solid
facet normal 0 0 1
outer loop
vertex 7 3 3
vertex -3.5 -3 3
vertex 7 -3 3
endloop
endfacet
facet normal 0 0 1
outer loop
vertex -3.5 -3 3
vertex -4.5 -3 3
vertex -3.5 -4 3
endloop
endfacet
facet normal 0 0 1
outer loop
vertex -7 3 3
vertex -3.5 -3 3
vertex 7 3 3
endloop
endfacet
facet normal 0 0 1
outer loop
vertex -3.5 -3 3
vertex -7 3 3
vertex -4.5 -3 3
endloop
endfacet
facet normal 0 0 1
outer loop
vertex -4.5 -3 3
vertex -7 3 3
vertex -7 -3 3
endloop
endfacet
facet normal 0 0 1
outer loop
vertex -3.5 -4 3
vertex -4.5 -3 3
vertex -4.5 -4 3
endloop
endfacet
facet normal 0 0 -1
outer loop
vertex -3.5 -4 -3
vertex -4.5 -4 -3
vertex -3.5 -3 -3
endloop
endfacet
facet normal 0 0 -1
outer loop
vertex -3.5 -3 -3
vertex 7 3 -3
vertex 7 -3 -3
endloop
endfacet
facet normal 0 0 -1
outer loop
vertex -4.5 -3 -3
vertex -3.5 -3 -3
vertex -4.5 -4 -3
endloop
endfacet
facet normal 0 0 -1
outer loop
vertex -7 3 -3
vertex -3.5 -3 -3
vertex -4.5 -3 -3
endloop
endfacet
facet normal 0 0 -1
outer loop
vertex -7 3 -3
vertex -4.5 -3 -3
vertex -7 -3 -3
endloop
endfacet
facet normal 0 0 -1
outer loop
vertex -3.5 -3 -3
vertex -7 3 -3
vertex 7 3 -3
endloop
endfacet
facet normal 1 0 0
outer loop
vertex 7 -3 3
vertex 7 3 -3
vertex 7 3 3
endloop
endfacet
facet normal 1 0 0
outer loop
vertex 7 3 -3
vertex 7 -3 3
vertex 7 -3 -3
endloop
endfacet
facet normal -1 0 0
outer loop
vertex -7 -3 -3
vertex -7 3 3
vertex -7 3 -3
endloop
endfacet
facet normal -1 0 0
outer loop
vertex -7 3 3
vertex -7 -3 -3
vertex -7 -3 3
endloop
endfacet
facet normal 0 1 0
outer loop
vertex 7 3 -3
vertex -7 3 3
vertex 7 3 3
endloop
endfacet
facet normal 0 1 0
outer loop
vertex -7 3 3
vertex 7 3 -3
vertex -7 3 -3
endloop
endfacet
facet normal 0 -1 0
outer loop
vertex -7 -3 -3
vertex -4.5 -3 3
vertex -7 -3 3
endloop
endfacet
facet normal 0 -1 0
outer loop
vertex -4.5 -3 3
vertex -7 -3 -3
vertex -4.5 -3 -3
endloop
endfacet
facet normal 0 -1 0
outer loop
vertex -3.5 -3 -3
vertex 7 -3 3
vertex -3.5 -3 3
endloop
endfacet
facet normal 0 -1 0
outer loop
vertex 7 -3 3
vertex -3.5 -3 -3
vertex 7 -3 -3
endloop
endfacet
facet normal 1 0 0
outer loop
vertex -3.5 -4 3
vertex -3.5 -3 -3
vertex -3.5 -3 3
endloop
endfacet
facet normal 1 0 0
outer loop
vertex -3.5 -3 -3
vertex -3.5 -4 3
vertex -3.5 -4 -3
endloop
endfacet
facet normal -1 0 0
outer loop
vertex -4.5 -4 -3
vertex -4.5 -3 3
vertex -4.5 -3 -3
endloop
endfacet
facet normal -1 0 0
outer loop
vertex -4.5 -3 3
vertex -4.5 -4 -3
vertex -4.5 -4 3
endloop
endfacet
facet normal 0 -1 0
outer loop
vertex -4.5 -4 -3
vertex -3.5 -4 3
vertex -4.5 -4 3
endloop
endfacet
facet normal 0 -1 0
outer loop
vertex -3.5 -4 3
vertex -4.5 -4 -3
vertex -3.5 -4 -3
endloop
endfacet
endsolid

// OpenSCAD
union() {
  // endstop_body
  // volume
  cube(size=[14.0, 6.0, 6.0], center=true);
  // switch
  translate(v=[-4.0, -3.5, 0.0])
  // volume
  cube(size=[1.0, 1.0, 6.0], center=true);
  // lever
  rotate(a=[0, 0, 255])
  {
    // volume
    cube(size=[0.5, 13.5, 6.0], center=true);
    difference() {
      cylinder(h=6, d=4, $fn=31, center=true);
      cylinder(h=6.04, d=3, $fn=23, center=true);
      translate(v=[4.5, 0, 0])
      cube(size=[10, 10, 20], center=true);
    }
  }
}
